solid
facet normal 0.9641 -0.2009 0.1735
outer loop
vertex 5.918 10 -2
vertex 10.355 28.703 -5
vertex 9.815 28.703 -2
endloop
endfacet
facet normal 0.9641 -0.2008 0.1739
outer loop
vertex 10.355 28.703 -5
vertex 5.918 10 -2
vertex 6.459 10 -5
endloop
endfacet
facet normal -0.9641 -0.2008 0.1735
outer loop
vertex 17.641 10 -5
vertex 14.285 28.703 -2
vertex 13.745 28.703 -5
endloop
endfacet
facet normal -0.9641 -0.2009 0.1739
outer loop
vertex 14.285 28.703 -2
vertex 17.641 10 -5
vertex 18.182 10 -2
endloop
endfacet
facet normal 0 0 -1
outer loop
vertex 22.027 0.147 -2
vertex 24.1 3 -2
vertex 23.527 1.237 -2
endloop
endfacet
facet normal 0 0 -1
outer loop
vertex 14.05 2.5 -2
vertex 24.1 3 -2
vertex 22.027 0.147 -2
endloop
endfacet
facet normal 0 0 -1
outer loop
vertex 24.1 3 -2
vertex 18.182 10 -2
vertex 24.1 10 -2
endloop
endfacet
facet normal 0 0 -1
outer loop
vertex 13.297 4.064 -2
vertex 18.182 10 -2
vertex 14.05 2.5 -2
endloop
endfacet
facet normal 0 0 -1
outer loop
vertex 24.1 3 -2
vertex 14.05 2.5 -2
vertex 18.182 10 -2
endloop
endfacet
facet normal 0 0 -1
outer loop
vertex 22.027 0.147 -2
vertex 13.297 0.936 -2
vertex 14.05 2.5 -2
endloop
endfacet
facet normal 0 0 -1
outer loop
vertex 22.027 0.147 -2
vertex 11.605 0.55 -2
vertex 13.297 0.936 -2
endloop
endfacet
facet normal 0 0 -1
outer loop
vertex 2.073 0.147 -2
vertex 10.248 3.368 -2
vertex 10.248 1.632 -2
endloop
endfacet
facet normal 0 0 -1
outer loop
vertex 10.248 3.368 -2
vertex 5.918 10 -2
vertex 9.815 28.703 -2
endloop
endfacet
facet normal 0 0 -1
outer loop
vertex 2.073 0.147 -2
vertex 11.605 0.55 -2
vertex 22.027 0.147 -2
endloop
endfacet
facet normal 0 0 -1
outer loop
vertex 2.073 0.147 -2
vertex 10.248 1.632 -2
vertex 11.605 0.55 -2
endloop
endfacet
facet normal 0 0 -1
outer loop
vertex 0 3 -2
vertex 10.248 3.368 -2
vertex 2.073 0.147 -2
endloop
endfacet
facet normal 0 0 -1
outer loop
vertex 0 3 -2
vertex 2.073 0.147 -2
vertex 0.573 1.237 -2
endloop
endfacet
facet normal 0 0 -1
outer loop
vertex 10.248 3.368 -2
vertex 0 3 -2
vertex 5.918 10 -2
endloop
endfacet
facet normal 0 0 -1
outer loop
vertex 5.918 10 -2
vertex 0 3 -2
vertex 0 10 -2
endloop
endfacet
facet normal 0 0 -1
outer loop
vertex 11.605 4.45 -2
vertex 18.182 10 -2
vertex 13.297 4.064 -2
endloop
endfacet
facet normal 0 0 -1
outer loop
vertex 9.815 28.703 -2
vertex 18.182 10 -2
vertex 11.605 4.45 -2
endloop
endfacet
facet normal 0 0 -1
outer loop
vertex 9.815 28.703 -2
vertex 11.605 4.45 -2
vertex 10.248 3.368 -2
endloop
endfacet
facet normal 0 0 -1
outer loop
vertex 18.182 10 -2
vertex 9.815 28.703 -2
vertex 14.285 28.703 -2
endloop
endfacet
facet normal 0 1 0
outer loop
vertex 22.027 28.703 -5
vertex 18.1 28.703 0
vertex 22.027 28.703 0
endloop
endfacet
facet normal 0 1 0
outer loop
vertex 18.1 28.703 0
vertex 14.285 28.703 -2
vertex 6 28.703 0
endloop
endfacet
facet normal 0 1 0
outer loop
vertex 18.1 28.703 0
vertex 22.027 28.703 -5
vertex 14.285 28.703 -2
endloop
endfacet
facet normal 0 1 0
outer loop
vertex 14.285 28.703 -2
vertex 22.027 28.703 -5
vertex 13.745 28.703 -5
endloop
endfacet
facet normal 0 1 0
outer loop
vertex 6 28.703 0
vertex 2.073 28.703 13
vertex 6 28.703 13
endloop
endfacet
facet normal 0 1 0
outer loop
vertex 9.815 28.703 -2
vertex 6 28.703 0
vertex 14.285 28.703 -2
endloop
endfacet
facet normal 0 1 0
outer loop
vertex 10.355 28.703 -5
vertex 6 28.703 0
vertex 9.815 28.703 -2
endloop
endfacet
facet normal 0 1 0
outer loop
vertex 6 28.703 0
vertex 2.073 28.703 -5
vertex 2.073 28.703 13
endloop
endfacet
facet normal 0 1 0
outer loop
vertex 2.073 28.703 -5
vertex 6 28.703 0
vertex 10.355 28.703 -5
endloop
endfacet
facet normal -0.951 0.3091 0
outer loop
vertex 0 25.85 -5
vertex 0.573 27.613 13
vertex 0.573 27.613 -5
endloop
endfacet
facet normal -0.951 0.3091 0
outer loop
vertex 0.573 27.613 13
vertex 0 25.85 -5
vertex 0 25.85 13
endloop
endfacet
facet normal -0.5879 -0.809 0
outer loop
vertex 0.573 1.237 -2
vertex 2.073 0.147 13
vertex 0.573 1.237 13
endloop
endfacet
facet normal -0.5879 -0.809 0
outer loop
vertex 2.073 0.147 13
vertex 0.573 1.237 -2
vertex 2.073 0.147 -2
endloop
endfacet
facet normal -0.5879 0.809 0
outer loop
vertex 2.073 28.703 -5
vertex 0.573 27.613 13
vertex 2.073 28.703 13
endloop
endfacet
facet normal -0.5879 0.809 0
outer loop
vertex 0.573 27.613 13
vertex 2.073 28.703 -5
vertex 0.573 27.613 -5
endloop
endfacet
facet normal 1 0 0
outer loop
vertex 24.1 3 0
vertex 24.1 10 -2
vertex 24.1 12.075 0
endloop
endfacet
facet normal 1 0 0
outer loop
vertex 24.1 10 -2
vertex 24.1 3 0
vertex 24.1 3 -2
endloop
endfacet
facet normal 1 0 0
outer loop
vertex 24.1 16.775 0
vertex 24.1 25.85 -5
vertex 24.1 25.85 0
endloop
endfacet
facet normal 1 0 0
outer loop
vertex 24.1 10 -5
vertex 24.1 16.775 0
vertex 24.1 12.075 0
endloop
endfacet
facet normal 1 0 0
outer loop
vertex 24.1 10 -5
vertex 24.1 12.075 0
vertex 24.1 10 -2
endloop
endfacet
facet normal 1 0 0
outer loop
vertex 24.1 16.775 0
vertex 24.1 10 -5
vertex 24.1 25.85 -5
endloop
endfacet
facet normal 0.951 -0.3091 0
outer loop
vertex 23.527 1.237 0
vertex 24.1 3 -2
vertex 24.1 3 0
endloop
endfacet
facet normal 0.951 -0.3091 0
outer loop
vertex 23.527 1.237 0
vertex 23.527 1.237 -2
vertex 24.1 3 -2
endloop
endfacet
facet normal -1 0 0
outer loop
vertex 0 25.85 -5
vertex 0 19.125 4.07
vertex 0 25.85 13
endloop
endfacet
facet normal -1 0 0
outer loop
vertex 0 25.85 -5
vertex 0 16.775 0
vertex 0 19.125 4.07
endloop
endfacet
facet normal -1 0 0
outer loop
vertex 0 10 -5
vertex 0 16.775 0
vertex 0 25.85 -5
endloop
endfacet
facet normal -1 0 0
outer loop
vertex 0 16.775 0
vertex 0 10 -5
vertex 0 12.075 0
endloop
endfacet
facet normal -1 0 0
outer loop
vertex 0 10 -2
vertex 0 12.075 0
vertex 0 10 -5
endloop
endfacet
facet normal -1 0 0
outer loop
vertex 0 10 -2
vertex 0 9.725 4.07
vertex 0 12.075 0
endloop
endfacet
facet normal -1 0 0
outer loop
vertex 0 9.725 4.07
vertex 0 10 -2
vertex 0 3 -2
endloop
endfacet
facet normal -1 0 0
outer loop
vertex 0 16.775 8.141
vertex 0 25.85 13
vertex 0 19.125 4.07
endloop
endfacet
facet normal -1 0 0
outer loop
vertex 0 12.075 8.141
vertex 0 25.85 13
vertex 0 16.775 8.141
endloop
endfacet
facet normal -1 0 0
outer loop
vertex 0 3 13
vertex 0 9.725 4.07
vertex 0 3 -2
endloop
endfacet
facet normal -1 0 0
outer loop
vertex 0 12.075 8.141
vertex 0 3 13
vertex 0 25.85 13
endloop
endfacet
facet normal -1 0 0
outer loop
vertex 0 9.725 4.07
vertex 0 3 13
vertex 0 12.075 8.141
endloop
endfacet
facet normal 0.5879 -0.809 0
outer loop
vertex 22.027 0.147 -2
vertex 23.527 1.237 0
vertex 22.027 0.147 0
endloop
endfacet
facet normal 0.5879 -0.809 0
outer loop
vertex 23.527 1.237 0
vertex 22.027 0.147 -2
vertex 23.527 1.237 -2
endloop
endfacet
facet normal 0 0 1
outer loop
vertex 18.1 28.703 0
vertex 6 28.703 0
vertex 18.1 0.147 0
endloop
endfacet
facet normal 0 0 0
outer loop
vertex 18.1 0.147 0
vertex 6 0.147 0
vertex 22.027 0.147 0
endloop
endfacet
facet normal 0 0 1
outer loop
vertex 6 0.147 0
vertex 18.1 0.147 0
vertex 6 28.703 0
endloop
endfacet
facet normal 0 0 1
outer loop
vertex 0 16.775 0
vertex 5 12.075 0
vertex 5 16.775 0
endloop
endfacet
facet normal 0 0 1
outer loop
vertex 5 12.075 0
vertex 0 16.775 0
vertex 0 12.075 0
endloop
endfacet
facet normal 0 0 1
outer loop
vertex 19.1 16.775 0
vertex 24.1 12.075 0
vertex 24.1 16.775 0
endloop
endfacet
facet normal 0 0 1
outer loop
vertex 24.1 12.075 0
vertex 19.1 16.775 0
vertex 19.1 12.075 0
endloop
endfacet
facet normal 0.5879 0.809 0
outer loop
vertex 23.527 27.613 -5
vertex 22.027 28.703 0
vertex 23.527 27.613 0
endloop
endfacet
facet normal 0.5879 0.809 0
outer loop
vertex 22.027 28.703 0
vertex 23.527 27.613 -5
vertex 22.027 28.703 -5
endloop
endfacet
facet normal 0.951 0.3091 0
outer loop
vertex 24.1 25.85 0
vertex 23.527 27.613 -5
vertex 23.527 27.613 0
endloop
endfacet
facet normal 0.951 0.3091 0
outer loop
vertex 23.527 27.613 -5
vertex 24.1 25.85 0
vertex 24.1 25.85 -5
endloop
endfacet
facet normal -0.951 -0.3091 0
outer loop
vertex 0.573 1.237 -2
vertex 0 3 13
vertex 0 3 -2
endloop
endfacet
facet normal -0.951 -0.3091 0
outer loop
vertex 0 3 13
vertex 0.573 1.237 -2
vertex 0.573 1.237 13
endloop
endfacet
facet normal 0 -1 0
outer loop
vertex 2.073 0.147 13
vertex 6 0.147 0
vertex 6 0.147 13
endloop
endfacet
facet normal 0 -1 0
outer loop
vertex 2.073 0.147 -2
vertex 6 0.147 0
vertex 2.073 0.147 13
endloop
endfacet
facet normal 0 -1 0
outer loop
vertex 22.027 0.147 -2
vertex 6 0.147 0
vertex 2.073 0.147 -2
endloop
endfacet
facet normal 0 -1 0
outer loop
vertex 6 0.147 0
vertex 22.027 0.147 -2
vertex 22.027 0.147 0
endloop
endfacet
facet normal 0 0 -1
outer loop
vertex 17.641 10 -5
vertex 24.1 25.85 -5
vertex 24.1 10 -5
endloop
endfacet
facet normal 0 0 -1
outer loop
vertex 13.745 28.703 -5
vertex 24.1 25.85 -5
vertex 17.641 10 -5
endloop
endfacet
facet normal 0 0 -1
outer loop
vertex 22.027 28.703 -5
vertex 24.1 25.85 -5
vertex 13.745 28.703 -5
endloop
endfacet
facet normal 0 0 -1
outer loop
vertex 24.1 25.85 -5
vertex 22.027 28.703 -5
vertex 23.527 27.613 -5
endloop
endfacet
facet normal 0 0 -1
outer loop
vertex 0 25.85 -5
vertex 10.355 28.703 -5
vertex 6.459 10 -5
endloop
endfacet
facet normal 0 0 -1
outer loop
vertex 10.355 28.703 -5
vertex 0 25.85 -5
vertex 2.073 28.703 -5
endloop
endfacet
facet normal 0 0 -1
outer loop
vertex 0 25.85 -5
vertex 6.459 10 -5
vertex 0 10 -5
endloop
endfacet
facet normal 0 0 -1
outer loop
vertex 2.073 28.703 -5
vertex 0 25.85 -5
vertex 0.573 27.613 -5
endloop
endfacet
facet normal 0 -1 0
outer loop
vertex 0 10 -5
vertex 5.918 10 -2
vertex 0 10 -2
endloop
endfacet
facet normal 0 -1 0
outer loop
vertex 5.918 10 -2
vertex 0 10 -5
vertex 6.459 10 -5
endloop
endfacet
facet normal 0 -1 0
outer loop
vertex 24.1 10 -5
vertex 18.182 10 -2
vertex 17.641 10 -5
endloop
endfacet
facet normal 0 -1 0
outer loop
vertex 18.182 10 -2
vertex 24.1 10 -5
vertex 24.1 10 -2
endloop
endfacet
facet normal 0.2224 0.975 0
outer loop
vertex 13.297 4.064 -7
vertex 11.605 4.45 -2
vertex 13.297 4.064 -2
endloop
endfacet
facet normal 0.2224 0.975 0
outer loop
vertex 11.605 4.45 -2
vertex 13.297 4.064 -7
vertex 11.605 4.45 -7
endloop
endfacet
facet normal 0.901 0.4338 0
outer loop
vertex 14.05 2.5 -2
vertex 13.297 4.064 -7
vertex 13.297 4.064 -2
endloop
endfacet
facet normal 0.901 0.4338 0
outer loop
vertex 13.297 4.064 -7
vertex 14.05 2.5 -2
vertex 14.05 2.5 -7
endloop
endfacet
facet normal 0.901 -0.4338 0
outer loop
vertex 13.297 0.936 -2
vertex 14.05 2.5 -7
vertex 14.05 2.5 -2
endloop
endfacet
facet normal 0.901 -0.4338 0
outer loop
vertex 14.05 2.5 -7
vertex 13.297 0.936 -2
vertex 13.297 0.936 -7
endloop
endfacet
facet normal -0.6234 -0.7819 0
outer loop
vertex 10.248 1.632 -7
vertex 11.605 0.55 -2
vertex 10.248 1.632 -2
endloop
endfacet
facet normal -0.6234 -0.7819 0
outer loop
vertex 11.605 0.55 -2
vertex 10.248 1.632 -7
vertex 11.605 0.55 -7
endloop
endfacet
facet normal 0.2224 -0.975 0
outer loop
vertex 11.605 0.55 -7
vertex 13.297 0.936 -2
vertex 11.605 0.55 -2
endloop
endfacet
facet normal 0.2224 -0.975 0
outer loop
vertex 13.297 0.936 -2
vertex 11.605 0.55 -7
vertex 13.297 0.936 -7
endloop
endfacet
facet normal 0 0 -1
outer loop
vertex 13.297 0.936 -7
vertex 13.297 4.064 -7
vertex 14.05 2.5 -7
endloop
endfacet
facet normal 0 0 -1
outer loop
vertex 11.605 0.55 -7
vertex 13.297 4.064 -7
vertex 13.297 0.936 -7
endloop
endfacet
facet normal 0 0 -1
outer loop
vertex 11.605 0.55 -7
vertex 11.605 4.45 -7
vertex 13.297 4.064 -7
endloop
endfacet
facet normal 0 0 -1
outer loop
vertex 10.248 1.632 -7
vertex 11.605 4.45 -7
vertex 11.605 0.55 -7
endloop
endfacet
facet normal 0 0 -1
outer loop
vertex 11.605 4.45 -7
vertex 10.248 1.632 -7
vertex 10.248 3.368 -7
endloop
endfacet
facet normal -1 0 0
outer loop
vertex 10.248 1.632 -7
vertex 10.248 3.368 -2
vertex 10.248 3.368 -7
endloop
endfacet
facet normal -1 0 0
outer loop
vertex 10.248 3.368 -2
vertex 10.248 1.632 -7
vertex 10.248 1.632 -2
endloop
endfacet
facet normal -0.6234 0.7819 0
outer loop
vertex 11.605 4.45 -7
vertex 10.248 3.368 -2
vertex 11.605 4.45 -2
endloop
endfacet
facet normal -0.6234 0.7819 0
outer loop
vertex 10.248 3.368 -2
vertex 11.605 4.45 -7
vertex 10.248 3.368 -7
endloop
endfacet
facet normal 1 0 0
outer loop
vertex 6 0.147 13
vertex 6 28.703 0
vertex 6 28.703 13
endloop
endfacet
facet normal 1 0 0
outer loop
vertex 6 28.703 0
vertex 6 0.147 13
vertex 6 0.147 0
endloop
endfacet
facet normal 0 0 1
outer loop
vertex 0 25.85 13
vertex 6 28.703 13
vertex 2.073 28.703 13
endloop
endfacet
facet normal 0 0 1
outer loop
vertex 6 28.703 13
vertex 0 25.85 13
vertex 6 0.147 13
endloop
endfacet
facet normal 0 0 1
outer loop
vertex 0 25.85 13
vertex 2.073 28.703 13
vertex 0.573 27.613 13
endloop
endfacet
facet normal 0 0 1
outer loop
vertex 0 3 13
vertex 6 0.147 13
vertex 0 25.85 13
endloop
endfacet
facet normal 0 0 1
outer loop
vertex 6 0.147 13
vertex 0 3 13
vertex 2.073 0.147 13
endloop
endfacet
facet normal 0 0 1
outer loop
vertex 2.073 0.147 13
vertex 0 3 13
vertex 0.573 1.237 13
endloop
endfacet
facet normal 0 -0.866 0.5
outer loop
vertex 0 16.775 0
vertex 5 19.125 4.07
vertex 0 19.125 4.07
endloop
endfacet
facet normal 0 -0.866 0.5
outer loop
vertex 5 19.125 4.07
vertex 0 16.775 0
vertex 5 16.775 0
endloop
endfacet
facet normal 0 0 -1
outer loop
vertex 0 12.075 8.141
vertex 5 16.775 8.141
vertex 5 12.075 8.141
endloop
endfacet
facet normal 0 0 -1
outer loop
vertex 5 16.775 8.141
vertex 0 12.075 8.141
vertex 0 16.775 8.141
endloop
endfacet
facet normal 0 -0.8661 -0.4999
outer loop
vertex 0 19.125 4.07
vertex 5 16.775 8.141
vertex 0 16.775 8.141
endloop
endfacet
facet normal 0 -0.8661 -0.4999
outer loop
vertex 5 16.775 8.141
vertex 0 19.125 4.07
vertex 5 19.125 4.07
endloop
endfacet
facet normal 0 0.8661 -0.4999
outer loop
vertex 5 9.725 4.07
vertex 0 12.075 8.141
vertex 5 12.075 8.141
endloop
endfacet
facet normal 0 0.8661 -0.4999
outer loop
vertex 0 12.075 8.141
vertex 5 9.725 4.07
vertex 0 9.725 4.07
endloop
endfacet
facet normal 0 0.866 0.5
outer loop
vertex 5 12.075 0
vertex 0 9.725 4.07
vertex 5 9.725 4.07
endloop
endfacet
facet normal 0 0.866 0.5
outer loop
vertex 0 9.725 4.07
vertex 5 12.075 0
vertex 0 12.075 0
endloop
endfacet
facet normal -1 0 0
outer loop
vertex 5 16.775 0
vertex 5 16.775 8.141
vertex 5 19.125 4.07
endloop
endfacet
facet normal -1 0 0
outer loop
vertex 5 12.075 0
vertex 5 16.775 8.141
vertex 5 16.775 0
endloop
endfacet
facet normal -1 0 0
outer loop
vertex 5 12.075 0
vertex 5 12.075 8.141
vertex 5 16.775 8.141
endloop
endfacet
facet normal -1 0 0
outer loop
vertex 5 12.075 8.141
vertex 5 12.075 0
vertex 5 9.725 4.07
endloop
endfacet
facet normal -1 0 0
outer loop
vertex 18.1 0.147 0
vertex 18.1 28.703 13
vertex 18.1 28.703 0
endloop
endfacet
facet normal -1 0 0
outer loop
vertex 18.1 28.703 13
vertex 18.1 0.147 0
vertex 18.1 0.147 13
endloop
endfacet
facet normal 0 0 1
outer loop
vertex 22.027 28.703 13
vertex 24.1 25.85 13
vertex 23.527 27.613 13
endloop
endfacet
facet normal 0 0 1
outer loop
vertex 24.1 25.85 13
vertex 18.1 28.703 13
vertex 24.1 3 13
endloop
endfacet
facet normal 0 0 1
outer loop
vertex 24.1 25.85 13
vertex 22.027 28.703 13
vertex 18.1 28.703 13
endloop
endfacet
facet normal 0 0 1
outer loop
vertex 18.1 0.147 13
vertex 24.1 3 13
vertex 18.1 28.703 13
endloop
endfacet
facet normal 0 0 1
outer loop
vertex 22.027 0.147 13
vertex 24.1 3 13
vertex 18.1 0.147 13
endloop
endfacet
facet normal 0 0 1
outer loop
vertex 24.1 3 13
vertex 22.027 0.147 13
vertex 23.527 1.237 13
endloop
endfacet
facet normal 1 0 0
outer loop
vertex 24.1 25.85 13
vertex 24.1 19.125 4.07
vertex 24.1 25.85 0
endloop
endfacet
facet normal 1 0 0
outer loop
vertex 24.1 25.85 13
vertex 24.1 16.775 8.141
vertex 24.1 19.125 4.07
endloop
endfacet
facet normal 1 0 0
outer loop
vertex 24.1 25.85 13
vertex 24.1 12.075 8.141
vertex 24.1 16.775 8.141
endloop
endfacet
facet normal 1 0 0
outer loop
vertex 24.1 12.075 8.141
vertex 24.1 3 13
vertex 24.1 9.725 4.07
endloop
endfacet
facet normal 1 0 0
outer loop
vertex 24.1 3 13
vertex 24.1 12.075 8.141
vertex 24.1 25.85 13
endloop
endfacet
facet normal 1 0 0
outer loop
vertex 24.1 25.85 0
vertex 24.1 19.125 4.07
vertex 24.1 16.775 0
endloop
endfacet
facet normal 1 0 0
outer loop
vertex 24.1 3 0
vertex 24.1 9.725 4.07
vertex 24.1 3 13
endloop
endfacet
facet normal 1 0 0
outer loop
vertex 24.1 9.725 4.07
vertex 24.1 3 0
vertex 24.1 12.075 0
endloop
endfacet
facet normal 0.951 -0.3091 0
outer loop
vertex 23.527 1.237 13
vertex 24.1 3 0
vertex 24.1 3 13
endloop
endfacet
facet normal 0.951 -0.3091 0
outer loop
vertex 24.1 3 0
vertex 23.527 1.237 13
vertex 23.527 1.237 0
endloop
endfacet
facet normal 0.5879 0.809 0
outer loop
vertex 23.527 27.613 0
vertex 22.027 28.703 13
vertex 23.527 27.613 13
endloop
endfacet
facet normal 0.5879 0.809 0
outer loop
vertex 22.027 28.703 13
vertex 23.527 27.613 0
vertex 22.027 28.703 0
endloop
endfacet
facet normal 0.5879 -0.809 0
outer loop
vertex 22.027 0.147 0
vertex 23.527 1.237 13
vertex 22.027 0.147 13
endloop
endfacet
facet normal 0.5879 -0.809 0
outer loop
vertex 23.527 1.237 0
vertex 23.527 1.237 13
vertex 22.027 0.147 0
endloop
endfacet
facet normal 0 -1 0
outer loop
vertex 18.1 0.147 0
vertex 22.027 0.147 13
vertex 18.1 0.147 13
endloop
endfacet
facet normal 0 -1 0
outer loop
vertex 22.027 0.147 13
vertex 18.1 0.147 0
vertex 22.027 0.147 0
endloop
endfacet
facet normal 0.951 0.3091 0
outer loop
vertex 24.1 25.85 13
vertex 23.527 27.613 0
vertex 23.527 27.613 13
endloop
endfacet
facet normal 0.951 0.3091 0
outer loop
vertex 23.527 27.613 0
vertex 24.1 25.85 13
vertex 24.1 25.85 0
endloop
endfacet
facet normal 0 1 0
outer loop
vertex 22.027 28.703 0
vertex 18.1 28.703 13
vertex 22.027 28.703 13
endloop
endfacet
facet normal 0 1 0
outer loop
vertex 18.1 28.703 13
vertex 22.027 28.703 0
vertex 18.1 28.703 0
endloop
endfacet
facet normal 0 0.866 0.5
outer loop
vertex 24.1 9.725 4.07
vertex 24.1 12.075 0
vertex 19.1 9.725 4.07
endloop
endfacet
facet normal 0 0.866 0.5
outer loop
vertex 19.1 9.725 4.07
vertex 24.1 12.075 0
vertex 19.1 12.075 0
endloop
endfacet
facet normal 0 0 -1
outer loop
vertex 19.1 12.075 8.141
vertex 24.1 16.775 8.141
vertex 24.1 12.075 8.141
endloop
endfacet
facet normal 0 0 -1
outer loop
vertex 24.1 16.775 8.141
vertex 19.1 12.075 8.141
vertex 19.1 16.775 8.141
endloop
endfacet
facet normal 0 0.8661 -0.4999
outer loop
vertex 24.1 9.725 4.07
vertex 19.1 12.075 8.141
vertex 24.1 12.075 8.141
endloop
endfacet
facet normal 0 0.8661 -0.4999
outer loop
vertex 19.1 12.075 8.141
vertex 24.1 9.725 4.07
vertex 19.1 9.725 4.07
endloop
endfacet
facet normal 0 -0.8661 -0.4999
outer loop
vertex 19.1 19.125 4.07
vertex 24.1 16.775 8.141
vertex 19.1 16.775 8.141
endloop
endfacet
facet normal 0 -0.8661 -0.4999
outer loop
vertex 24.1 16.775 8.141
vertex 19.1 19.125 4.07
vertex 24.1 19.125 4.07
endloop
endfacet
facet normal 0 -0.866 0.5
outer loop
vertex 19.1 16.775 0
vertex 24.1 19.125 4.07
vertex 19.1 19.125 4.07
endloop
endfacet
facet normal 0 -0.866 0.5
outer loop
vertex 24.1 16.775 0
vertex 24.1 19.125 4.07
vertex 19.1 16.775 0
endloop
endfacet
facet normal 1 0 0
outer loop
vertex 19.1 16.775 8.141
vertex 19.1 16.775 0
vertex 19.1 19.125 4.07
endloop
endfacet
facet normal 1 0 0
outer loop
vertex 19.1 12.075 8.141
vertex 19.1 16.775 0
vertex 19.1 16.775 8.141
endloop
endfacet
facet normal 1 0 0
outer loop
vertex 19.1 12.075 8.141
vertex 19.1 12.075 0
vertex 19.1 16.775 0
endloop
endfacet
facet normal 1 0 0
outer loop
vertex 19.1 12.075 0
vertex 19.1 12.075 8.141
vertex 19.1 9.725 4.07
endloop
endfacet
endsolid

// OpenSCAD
// file: ../util/rotate_around.scad
module rotate_around(r, c) {
  translate(c) rotate(r) translate(-c) children();
}
// file: ../util/notch.scad
include <rotate_around.scad>

M = 1000;  // A big number

module notch(base, height, slope, extended_base = 0) {
  hypotenuse = sqrt(pow(base / 2, 2) + pow(height, 2));
  angle = atan(base / (2 * height));
  intersection() {
    rotate_around([ 0, 0, angle ], [ base / 2, 0, 0 ])
        rotate_around([ 0, -slope, 0 ], [ base / 2, 0, 0 ])
            translate([ base / 2 - M, -M / 2, -M / 2 ]) cube([ M, M, M ]);
    rotate_around([ 0, 0, -angle ], [ -base / 2, 0, 0 ])
        rotate_around([ 0, slope, 0 ], [ -base / 2, 0, 0 ])
            translate([ -base / 2, -M / 2, -M / 2 ]) cube([ M, M, M ]);
    rotate([ -slope, 0, 0 ]) translate([ base / 2 - M / 2, 0, -M / 2 ])
        cube([ M, height, M ]);
    translate([ base / 2 - M / 2, -M / 2, -extended_base ]) cube([ M, M, 100 ]);
  }
}
// file: ../util/holes.scad
module holes() {
  translate([ 5.05, 3.8, 0 ]) children();
  translate([ 3.55, 12.1, 0 ]) children();
  translate([ 21.55, 12.1, 0 ]) children();
  translate([ 21.55, 25.8, 0 ]) children();
  translate([ 3.55, 23.9, 0 ]) children();
}
// file: ../util/rounded_square.scad
module rounded_square(dimensions, r = 1) {
  minkowski() {
    circle(r);
    translate([ r, r, 0 ]) square(dimensions - [ 2 * r, 2 * r ]);
  }
}
// file: ../global.scad
plate_dimensions = [ 24.1, 28.85 ];
plate_radius = 3;

hinge_center = [ plate_dimensions.x / 2, 2.5 ];
hinge_radius = 2;
hinge_clearance = 0.5;
notch_clearance = 1;
slope = 10;
notch_base = 12.5;
notch_height = 30;
notch_position = [ plate_dimensions.x / 2, 9, 7.5 ];
// file: ../tool_attachment.scad
include <global.scad>
include <util/holes.scad>
include <util/notch.scad>
include <util/rounded_square.scad>

module tool_attachment() {
  difference() {
    translate([ 0, 0, 5 ]) linear_extrude(5)
        rounded_square(plate_dimensions, plate_radius);
    translate([ 0, 0, 5 ]) cube([ plate_dimensions.x, 10, 3 ]);
    intersection() {
      linear_extrude(100) rounded_square(plate_dimensions, plate_radius);
      translate(notch_position) rotate([ 0, 180, 0 ])
          notch(notch_base, notch_height, slope, extended_base = 0.5);
    }
  }
  l = 3;
  translate([ hinge_center.x, hinge_center.y, l ])
      cylinder(h = 8 - l, r = hinge_radius);
}
// main file
include <../tool_attachment.scad>
include <../global.scad>
include <../util/rounded_square.scad>

module nut_hole() {
    translate([0, 0, 0]) group() {
        cylinder(h = 2.5, r =3.5, $fn=6);
        cylinder(h = 9, r = 1.75);
    }
}

module hole() {
    wall = 6;
    difference() {
        intersection() {
            cube([wall, plate_dimensions.y, 13]);
            linear_extrude(100) rounded_square(plate_dimensions, plate_radius); 
        }
        translate([0, plate_dimensions.y / 2, 4.7 * sqrt(3) / 2]) rotate([90, 0, 0]) rotate([0, 90, 0]) cylinder(h = 5, r = 4.7, $fn = 6);
        //translate([wall/2, plate_dimensions.y/2, 4.7 * sqrt(3)]) rotate([0, 0, 30]) nut_hole();
    }
}

translate([0, 0, -10]) tool_attachment();
hole();
translate([plate_dimensions.x, plate_dimensions.y, 0]) rotate([0, 0, 180]) hole(); 
